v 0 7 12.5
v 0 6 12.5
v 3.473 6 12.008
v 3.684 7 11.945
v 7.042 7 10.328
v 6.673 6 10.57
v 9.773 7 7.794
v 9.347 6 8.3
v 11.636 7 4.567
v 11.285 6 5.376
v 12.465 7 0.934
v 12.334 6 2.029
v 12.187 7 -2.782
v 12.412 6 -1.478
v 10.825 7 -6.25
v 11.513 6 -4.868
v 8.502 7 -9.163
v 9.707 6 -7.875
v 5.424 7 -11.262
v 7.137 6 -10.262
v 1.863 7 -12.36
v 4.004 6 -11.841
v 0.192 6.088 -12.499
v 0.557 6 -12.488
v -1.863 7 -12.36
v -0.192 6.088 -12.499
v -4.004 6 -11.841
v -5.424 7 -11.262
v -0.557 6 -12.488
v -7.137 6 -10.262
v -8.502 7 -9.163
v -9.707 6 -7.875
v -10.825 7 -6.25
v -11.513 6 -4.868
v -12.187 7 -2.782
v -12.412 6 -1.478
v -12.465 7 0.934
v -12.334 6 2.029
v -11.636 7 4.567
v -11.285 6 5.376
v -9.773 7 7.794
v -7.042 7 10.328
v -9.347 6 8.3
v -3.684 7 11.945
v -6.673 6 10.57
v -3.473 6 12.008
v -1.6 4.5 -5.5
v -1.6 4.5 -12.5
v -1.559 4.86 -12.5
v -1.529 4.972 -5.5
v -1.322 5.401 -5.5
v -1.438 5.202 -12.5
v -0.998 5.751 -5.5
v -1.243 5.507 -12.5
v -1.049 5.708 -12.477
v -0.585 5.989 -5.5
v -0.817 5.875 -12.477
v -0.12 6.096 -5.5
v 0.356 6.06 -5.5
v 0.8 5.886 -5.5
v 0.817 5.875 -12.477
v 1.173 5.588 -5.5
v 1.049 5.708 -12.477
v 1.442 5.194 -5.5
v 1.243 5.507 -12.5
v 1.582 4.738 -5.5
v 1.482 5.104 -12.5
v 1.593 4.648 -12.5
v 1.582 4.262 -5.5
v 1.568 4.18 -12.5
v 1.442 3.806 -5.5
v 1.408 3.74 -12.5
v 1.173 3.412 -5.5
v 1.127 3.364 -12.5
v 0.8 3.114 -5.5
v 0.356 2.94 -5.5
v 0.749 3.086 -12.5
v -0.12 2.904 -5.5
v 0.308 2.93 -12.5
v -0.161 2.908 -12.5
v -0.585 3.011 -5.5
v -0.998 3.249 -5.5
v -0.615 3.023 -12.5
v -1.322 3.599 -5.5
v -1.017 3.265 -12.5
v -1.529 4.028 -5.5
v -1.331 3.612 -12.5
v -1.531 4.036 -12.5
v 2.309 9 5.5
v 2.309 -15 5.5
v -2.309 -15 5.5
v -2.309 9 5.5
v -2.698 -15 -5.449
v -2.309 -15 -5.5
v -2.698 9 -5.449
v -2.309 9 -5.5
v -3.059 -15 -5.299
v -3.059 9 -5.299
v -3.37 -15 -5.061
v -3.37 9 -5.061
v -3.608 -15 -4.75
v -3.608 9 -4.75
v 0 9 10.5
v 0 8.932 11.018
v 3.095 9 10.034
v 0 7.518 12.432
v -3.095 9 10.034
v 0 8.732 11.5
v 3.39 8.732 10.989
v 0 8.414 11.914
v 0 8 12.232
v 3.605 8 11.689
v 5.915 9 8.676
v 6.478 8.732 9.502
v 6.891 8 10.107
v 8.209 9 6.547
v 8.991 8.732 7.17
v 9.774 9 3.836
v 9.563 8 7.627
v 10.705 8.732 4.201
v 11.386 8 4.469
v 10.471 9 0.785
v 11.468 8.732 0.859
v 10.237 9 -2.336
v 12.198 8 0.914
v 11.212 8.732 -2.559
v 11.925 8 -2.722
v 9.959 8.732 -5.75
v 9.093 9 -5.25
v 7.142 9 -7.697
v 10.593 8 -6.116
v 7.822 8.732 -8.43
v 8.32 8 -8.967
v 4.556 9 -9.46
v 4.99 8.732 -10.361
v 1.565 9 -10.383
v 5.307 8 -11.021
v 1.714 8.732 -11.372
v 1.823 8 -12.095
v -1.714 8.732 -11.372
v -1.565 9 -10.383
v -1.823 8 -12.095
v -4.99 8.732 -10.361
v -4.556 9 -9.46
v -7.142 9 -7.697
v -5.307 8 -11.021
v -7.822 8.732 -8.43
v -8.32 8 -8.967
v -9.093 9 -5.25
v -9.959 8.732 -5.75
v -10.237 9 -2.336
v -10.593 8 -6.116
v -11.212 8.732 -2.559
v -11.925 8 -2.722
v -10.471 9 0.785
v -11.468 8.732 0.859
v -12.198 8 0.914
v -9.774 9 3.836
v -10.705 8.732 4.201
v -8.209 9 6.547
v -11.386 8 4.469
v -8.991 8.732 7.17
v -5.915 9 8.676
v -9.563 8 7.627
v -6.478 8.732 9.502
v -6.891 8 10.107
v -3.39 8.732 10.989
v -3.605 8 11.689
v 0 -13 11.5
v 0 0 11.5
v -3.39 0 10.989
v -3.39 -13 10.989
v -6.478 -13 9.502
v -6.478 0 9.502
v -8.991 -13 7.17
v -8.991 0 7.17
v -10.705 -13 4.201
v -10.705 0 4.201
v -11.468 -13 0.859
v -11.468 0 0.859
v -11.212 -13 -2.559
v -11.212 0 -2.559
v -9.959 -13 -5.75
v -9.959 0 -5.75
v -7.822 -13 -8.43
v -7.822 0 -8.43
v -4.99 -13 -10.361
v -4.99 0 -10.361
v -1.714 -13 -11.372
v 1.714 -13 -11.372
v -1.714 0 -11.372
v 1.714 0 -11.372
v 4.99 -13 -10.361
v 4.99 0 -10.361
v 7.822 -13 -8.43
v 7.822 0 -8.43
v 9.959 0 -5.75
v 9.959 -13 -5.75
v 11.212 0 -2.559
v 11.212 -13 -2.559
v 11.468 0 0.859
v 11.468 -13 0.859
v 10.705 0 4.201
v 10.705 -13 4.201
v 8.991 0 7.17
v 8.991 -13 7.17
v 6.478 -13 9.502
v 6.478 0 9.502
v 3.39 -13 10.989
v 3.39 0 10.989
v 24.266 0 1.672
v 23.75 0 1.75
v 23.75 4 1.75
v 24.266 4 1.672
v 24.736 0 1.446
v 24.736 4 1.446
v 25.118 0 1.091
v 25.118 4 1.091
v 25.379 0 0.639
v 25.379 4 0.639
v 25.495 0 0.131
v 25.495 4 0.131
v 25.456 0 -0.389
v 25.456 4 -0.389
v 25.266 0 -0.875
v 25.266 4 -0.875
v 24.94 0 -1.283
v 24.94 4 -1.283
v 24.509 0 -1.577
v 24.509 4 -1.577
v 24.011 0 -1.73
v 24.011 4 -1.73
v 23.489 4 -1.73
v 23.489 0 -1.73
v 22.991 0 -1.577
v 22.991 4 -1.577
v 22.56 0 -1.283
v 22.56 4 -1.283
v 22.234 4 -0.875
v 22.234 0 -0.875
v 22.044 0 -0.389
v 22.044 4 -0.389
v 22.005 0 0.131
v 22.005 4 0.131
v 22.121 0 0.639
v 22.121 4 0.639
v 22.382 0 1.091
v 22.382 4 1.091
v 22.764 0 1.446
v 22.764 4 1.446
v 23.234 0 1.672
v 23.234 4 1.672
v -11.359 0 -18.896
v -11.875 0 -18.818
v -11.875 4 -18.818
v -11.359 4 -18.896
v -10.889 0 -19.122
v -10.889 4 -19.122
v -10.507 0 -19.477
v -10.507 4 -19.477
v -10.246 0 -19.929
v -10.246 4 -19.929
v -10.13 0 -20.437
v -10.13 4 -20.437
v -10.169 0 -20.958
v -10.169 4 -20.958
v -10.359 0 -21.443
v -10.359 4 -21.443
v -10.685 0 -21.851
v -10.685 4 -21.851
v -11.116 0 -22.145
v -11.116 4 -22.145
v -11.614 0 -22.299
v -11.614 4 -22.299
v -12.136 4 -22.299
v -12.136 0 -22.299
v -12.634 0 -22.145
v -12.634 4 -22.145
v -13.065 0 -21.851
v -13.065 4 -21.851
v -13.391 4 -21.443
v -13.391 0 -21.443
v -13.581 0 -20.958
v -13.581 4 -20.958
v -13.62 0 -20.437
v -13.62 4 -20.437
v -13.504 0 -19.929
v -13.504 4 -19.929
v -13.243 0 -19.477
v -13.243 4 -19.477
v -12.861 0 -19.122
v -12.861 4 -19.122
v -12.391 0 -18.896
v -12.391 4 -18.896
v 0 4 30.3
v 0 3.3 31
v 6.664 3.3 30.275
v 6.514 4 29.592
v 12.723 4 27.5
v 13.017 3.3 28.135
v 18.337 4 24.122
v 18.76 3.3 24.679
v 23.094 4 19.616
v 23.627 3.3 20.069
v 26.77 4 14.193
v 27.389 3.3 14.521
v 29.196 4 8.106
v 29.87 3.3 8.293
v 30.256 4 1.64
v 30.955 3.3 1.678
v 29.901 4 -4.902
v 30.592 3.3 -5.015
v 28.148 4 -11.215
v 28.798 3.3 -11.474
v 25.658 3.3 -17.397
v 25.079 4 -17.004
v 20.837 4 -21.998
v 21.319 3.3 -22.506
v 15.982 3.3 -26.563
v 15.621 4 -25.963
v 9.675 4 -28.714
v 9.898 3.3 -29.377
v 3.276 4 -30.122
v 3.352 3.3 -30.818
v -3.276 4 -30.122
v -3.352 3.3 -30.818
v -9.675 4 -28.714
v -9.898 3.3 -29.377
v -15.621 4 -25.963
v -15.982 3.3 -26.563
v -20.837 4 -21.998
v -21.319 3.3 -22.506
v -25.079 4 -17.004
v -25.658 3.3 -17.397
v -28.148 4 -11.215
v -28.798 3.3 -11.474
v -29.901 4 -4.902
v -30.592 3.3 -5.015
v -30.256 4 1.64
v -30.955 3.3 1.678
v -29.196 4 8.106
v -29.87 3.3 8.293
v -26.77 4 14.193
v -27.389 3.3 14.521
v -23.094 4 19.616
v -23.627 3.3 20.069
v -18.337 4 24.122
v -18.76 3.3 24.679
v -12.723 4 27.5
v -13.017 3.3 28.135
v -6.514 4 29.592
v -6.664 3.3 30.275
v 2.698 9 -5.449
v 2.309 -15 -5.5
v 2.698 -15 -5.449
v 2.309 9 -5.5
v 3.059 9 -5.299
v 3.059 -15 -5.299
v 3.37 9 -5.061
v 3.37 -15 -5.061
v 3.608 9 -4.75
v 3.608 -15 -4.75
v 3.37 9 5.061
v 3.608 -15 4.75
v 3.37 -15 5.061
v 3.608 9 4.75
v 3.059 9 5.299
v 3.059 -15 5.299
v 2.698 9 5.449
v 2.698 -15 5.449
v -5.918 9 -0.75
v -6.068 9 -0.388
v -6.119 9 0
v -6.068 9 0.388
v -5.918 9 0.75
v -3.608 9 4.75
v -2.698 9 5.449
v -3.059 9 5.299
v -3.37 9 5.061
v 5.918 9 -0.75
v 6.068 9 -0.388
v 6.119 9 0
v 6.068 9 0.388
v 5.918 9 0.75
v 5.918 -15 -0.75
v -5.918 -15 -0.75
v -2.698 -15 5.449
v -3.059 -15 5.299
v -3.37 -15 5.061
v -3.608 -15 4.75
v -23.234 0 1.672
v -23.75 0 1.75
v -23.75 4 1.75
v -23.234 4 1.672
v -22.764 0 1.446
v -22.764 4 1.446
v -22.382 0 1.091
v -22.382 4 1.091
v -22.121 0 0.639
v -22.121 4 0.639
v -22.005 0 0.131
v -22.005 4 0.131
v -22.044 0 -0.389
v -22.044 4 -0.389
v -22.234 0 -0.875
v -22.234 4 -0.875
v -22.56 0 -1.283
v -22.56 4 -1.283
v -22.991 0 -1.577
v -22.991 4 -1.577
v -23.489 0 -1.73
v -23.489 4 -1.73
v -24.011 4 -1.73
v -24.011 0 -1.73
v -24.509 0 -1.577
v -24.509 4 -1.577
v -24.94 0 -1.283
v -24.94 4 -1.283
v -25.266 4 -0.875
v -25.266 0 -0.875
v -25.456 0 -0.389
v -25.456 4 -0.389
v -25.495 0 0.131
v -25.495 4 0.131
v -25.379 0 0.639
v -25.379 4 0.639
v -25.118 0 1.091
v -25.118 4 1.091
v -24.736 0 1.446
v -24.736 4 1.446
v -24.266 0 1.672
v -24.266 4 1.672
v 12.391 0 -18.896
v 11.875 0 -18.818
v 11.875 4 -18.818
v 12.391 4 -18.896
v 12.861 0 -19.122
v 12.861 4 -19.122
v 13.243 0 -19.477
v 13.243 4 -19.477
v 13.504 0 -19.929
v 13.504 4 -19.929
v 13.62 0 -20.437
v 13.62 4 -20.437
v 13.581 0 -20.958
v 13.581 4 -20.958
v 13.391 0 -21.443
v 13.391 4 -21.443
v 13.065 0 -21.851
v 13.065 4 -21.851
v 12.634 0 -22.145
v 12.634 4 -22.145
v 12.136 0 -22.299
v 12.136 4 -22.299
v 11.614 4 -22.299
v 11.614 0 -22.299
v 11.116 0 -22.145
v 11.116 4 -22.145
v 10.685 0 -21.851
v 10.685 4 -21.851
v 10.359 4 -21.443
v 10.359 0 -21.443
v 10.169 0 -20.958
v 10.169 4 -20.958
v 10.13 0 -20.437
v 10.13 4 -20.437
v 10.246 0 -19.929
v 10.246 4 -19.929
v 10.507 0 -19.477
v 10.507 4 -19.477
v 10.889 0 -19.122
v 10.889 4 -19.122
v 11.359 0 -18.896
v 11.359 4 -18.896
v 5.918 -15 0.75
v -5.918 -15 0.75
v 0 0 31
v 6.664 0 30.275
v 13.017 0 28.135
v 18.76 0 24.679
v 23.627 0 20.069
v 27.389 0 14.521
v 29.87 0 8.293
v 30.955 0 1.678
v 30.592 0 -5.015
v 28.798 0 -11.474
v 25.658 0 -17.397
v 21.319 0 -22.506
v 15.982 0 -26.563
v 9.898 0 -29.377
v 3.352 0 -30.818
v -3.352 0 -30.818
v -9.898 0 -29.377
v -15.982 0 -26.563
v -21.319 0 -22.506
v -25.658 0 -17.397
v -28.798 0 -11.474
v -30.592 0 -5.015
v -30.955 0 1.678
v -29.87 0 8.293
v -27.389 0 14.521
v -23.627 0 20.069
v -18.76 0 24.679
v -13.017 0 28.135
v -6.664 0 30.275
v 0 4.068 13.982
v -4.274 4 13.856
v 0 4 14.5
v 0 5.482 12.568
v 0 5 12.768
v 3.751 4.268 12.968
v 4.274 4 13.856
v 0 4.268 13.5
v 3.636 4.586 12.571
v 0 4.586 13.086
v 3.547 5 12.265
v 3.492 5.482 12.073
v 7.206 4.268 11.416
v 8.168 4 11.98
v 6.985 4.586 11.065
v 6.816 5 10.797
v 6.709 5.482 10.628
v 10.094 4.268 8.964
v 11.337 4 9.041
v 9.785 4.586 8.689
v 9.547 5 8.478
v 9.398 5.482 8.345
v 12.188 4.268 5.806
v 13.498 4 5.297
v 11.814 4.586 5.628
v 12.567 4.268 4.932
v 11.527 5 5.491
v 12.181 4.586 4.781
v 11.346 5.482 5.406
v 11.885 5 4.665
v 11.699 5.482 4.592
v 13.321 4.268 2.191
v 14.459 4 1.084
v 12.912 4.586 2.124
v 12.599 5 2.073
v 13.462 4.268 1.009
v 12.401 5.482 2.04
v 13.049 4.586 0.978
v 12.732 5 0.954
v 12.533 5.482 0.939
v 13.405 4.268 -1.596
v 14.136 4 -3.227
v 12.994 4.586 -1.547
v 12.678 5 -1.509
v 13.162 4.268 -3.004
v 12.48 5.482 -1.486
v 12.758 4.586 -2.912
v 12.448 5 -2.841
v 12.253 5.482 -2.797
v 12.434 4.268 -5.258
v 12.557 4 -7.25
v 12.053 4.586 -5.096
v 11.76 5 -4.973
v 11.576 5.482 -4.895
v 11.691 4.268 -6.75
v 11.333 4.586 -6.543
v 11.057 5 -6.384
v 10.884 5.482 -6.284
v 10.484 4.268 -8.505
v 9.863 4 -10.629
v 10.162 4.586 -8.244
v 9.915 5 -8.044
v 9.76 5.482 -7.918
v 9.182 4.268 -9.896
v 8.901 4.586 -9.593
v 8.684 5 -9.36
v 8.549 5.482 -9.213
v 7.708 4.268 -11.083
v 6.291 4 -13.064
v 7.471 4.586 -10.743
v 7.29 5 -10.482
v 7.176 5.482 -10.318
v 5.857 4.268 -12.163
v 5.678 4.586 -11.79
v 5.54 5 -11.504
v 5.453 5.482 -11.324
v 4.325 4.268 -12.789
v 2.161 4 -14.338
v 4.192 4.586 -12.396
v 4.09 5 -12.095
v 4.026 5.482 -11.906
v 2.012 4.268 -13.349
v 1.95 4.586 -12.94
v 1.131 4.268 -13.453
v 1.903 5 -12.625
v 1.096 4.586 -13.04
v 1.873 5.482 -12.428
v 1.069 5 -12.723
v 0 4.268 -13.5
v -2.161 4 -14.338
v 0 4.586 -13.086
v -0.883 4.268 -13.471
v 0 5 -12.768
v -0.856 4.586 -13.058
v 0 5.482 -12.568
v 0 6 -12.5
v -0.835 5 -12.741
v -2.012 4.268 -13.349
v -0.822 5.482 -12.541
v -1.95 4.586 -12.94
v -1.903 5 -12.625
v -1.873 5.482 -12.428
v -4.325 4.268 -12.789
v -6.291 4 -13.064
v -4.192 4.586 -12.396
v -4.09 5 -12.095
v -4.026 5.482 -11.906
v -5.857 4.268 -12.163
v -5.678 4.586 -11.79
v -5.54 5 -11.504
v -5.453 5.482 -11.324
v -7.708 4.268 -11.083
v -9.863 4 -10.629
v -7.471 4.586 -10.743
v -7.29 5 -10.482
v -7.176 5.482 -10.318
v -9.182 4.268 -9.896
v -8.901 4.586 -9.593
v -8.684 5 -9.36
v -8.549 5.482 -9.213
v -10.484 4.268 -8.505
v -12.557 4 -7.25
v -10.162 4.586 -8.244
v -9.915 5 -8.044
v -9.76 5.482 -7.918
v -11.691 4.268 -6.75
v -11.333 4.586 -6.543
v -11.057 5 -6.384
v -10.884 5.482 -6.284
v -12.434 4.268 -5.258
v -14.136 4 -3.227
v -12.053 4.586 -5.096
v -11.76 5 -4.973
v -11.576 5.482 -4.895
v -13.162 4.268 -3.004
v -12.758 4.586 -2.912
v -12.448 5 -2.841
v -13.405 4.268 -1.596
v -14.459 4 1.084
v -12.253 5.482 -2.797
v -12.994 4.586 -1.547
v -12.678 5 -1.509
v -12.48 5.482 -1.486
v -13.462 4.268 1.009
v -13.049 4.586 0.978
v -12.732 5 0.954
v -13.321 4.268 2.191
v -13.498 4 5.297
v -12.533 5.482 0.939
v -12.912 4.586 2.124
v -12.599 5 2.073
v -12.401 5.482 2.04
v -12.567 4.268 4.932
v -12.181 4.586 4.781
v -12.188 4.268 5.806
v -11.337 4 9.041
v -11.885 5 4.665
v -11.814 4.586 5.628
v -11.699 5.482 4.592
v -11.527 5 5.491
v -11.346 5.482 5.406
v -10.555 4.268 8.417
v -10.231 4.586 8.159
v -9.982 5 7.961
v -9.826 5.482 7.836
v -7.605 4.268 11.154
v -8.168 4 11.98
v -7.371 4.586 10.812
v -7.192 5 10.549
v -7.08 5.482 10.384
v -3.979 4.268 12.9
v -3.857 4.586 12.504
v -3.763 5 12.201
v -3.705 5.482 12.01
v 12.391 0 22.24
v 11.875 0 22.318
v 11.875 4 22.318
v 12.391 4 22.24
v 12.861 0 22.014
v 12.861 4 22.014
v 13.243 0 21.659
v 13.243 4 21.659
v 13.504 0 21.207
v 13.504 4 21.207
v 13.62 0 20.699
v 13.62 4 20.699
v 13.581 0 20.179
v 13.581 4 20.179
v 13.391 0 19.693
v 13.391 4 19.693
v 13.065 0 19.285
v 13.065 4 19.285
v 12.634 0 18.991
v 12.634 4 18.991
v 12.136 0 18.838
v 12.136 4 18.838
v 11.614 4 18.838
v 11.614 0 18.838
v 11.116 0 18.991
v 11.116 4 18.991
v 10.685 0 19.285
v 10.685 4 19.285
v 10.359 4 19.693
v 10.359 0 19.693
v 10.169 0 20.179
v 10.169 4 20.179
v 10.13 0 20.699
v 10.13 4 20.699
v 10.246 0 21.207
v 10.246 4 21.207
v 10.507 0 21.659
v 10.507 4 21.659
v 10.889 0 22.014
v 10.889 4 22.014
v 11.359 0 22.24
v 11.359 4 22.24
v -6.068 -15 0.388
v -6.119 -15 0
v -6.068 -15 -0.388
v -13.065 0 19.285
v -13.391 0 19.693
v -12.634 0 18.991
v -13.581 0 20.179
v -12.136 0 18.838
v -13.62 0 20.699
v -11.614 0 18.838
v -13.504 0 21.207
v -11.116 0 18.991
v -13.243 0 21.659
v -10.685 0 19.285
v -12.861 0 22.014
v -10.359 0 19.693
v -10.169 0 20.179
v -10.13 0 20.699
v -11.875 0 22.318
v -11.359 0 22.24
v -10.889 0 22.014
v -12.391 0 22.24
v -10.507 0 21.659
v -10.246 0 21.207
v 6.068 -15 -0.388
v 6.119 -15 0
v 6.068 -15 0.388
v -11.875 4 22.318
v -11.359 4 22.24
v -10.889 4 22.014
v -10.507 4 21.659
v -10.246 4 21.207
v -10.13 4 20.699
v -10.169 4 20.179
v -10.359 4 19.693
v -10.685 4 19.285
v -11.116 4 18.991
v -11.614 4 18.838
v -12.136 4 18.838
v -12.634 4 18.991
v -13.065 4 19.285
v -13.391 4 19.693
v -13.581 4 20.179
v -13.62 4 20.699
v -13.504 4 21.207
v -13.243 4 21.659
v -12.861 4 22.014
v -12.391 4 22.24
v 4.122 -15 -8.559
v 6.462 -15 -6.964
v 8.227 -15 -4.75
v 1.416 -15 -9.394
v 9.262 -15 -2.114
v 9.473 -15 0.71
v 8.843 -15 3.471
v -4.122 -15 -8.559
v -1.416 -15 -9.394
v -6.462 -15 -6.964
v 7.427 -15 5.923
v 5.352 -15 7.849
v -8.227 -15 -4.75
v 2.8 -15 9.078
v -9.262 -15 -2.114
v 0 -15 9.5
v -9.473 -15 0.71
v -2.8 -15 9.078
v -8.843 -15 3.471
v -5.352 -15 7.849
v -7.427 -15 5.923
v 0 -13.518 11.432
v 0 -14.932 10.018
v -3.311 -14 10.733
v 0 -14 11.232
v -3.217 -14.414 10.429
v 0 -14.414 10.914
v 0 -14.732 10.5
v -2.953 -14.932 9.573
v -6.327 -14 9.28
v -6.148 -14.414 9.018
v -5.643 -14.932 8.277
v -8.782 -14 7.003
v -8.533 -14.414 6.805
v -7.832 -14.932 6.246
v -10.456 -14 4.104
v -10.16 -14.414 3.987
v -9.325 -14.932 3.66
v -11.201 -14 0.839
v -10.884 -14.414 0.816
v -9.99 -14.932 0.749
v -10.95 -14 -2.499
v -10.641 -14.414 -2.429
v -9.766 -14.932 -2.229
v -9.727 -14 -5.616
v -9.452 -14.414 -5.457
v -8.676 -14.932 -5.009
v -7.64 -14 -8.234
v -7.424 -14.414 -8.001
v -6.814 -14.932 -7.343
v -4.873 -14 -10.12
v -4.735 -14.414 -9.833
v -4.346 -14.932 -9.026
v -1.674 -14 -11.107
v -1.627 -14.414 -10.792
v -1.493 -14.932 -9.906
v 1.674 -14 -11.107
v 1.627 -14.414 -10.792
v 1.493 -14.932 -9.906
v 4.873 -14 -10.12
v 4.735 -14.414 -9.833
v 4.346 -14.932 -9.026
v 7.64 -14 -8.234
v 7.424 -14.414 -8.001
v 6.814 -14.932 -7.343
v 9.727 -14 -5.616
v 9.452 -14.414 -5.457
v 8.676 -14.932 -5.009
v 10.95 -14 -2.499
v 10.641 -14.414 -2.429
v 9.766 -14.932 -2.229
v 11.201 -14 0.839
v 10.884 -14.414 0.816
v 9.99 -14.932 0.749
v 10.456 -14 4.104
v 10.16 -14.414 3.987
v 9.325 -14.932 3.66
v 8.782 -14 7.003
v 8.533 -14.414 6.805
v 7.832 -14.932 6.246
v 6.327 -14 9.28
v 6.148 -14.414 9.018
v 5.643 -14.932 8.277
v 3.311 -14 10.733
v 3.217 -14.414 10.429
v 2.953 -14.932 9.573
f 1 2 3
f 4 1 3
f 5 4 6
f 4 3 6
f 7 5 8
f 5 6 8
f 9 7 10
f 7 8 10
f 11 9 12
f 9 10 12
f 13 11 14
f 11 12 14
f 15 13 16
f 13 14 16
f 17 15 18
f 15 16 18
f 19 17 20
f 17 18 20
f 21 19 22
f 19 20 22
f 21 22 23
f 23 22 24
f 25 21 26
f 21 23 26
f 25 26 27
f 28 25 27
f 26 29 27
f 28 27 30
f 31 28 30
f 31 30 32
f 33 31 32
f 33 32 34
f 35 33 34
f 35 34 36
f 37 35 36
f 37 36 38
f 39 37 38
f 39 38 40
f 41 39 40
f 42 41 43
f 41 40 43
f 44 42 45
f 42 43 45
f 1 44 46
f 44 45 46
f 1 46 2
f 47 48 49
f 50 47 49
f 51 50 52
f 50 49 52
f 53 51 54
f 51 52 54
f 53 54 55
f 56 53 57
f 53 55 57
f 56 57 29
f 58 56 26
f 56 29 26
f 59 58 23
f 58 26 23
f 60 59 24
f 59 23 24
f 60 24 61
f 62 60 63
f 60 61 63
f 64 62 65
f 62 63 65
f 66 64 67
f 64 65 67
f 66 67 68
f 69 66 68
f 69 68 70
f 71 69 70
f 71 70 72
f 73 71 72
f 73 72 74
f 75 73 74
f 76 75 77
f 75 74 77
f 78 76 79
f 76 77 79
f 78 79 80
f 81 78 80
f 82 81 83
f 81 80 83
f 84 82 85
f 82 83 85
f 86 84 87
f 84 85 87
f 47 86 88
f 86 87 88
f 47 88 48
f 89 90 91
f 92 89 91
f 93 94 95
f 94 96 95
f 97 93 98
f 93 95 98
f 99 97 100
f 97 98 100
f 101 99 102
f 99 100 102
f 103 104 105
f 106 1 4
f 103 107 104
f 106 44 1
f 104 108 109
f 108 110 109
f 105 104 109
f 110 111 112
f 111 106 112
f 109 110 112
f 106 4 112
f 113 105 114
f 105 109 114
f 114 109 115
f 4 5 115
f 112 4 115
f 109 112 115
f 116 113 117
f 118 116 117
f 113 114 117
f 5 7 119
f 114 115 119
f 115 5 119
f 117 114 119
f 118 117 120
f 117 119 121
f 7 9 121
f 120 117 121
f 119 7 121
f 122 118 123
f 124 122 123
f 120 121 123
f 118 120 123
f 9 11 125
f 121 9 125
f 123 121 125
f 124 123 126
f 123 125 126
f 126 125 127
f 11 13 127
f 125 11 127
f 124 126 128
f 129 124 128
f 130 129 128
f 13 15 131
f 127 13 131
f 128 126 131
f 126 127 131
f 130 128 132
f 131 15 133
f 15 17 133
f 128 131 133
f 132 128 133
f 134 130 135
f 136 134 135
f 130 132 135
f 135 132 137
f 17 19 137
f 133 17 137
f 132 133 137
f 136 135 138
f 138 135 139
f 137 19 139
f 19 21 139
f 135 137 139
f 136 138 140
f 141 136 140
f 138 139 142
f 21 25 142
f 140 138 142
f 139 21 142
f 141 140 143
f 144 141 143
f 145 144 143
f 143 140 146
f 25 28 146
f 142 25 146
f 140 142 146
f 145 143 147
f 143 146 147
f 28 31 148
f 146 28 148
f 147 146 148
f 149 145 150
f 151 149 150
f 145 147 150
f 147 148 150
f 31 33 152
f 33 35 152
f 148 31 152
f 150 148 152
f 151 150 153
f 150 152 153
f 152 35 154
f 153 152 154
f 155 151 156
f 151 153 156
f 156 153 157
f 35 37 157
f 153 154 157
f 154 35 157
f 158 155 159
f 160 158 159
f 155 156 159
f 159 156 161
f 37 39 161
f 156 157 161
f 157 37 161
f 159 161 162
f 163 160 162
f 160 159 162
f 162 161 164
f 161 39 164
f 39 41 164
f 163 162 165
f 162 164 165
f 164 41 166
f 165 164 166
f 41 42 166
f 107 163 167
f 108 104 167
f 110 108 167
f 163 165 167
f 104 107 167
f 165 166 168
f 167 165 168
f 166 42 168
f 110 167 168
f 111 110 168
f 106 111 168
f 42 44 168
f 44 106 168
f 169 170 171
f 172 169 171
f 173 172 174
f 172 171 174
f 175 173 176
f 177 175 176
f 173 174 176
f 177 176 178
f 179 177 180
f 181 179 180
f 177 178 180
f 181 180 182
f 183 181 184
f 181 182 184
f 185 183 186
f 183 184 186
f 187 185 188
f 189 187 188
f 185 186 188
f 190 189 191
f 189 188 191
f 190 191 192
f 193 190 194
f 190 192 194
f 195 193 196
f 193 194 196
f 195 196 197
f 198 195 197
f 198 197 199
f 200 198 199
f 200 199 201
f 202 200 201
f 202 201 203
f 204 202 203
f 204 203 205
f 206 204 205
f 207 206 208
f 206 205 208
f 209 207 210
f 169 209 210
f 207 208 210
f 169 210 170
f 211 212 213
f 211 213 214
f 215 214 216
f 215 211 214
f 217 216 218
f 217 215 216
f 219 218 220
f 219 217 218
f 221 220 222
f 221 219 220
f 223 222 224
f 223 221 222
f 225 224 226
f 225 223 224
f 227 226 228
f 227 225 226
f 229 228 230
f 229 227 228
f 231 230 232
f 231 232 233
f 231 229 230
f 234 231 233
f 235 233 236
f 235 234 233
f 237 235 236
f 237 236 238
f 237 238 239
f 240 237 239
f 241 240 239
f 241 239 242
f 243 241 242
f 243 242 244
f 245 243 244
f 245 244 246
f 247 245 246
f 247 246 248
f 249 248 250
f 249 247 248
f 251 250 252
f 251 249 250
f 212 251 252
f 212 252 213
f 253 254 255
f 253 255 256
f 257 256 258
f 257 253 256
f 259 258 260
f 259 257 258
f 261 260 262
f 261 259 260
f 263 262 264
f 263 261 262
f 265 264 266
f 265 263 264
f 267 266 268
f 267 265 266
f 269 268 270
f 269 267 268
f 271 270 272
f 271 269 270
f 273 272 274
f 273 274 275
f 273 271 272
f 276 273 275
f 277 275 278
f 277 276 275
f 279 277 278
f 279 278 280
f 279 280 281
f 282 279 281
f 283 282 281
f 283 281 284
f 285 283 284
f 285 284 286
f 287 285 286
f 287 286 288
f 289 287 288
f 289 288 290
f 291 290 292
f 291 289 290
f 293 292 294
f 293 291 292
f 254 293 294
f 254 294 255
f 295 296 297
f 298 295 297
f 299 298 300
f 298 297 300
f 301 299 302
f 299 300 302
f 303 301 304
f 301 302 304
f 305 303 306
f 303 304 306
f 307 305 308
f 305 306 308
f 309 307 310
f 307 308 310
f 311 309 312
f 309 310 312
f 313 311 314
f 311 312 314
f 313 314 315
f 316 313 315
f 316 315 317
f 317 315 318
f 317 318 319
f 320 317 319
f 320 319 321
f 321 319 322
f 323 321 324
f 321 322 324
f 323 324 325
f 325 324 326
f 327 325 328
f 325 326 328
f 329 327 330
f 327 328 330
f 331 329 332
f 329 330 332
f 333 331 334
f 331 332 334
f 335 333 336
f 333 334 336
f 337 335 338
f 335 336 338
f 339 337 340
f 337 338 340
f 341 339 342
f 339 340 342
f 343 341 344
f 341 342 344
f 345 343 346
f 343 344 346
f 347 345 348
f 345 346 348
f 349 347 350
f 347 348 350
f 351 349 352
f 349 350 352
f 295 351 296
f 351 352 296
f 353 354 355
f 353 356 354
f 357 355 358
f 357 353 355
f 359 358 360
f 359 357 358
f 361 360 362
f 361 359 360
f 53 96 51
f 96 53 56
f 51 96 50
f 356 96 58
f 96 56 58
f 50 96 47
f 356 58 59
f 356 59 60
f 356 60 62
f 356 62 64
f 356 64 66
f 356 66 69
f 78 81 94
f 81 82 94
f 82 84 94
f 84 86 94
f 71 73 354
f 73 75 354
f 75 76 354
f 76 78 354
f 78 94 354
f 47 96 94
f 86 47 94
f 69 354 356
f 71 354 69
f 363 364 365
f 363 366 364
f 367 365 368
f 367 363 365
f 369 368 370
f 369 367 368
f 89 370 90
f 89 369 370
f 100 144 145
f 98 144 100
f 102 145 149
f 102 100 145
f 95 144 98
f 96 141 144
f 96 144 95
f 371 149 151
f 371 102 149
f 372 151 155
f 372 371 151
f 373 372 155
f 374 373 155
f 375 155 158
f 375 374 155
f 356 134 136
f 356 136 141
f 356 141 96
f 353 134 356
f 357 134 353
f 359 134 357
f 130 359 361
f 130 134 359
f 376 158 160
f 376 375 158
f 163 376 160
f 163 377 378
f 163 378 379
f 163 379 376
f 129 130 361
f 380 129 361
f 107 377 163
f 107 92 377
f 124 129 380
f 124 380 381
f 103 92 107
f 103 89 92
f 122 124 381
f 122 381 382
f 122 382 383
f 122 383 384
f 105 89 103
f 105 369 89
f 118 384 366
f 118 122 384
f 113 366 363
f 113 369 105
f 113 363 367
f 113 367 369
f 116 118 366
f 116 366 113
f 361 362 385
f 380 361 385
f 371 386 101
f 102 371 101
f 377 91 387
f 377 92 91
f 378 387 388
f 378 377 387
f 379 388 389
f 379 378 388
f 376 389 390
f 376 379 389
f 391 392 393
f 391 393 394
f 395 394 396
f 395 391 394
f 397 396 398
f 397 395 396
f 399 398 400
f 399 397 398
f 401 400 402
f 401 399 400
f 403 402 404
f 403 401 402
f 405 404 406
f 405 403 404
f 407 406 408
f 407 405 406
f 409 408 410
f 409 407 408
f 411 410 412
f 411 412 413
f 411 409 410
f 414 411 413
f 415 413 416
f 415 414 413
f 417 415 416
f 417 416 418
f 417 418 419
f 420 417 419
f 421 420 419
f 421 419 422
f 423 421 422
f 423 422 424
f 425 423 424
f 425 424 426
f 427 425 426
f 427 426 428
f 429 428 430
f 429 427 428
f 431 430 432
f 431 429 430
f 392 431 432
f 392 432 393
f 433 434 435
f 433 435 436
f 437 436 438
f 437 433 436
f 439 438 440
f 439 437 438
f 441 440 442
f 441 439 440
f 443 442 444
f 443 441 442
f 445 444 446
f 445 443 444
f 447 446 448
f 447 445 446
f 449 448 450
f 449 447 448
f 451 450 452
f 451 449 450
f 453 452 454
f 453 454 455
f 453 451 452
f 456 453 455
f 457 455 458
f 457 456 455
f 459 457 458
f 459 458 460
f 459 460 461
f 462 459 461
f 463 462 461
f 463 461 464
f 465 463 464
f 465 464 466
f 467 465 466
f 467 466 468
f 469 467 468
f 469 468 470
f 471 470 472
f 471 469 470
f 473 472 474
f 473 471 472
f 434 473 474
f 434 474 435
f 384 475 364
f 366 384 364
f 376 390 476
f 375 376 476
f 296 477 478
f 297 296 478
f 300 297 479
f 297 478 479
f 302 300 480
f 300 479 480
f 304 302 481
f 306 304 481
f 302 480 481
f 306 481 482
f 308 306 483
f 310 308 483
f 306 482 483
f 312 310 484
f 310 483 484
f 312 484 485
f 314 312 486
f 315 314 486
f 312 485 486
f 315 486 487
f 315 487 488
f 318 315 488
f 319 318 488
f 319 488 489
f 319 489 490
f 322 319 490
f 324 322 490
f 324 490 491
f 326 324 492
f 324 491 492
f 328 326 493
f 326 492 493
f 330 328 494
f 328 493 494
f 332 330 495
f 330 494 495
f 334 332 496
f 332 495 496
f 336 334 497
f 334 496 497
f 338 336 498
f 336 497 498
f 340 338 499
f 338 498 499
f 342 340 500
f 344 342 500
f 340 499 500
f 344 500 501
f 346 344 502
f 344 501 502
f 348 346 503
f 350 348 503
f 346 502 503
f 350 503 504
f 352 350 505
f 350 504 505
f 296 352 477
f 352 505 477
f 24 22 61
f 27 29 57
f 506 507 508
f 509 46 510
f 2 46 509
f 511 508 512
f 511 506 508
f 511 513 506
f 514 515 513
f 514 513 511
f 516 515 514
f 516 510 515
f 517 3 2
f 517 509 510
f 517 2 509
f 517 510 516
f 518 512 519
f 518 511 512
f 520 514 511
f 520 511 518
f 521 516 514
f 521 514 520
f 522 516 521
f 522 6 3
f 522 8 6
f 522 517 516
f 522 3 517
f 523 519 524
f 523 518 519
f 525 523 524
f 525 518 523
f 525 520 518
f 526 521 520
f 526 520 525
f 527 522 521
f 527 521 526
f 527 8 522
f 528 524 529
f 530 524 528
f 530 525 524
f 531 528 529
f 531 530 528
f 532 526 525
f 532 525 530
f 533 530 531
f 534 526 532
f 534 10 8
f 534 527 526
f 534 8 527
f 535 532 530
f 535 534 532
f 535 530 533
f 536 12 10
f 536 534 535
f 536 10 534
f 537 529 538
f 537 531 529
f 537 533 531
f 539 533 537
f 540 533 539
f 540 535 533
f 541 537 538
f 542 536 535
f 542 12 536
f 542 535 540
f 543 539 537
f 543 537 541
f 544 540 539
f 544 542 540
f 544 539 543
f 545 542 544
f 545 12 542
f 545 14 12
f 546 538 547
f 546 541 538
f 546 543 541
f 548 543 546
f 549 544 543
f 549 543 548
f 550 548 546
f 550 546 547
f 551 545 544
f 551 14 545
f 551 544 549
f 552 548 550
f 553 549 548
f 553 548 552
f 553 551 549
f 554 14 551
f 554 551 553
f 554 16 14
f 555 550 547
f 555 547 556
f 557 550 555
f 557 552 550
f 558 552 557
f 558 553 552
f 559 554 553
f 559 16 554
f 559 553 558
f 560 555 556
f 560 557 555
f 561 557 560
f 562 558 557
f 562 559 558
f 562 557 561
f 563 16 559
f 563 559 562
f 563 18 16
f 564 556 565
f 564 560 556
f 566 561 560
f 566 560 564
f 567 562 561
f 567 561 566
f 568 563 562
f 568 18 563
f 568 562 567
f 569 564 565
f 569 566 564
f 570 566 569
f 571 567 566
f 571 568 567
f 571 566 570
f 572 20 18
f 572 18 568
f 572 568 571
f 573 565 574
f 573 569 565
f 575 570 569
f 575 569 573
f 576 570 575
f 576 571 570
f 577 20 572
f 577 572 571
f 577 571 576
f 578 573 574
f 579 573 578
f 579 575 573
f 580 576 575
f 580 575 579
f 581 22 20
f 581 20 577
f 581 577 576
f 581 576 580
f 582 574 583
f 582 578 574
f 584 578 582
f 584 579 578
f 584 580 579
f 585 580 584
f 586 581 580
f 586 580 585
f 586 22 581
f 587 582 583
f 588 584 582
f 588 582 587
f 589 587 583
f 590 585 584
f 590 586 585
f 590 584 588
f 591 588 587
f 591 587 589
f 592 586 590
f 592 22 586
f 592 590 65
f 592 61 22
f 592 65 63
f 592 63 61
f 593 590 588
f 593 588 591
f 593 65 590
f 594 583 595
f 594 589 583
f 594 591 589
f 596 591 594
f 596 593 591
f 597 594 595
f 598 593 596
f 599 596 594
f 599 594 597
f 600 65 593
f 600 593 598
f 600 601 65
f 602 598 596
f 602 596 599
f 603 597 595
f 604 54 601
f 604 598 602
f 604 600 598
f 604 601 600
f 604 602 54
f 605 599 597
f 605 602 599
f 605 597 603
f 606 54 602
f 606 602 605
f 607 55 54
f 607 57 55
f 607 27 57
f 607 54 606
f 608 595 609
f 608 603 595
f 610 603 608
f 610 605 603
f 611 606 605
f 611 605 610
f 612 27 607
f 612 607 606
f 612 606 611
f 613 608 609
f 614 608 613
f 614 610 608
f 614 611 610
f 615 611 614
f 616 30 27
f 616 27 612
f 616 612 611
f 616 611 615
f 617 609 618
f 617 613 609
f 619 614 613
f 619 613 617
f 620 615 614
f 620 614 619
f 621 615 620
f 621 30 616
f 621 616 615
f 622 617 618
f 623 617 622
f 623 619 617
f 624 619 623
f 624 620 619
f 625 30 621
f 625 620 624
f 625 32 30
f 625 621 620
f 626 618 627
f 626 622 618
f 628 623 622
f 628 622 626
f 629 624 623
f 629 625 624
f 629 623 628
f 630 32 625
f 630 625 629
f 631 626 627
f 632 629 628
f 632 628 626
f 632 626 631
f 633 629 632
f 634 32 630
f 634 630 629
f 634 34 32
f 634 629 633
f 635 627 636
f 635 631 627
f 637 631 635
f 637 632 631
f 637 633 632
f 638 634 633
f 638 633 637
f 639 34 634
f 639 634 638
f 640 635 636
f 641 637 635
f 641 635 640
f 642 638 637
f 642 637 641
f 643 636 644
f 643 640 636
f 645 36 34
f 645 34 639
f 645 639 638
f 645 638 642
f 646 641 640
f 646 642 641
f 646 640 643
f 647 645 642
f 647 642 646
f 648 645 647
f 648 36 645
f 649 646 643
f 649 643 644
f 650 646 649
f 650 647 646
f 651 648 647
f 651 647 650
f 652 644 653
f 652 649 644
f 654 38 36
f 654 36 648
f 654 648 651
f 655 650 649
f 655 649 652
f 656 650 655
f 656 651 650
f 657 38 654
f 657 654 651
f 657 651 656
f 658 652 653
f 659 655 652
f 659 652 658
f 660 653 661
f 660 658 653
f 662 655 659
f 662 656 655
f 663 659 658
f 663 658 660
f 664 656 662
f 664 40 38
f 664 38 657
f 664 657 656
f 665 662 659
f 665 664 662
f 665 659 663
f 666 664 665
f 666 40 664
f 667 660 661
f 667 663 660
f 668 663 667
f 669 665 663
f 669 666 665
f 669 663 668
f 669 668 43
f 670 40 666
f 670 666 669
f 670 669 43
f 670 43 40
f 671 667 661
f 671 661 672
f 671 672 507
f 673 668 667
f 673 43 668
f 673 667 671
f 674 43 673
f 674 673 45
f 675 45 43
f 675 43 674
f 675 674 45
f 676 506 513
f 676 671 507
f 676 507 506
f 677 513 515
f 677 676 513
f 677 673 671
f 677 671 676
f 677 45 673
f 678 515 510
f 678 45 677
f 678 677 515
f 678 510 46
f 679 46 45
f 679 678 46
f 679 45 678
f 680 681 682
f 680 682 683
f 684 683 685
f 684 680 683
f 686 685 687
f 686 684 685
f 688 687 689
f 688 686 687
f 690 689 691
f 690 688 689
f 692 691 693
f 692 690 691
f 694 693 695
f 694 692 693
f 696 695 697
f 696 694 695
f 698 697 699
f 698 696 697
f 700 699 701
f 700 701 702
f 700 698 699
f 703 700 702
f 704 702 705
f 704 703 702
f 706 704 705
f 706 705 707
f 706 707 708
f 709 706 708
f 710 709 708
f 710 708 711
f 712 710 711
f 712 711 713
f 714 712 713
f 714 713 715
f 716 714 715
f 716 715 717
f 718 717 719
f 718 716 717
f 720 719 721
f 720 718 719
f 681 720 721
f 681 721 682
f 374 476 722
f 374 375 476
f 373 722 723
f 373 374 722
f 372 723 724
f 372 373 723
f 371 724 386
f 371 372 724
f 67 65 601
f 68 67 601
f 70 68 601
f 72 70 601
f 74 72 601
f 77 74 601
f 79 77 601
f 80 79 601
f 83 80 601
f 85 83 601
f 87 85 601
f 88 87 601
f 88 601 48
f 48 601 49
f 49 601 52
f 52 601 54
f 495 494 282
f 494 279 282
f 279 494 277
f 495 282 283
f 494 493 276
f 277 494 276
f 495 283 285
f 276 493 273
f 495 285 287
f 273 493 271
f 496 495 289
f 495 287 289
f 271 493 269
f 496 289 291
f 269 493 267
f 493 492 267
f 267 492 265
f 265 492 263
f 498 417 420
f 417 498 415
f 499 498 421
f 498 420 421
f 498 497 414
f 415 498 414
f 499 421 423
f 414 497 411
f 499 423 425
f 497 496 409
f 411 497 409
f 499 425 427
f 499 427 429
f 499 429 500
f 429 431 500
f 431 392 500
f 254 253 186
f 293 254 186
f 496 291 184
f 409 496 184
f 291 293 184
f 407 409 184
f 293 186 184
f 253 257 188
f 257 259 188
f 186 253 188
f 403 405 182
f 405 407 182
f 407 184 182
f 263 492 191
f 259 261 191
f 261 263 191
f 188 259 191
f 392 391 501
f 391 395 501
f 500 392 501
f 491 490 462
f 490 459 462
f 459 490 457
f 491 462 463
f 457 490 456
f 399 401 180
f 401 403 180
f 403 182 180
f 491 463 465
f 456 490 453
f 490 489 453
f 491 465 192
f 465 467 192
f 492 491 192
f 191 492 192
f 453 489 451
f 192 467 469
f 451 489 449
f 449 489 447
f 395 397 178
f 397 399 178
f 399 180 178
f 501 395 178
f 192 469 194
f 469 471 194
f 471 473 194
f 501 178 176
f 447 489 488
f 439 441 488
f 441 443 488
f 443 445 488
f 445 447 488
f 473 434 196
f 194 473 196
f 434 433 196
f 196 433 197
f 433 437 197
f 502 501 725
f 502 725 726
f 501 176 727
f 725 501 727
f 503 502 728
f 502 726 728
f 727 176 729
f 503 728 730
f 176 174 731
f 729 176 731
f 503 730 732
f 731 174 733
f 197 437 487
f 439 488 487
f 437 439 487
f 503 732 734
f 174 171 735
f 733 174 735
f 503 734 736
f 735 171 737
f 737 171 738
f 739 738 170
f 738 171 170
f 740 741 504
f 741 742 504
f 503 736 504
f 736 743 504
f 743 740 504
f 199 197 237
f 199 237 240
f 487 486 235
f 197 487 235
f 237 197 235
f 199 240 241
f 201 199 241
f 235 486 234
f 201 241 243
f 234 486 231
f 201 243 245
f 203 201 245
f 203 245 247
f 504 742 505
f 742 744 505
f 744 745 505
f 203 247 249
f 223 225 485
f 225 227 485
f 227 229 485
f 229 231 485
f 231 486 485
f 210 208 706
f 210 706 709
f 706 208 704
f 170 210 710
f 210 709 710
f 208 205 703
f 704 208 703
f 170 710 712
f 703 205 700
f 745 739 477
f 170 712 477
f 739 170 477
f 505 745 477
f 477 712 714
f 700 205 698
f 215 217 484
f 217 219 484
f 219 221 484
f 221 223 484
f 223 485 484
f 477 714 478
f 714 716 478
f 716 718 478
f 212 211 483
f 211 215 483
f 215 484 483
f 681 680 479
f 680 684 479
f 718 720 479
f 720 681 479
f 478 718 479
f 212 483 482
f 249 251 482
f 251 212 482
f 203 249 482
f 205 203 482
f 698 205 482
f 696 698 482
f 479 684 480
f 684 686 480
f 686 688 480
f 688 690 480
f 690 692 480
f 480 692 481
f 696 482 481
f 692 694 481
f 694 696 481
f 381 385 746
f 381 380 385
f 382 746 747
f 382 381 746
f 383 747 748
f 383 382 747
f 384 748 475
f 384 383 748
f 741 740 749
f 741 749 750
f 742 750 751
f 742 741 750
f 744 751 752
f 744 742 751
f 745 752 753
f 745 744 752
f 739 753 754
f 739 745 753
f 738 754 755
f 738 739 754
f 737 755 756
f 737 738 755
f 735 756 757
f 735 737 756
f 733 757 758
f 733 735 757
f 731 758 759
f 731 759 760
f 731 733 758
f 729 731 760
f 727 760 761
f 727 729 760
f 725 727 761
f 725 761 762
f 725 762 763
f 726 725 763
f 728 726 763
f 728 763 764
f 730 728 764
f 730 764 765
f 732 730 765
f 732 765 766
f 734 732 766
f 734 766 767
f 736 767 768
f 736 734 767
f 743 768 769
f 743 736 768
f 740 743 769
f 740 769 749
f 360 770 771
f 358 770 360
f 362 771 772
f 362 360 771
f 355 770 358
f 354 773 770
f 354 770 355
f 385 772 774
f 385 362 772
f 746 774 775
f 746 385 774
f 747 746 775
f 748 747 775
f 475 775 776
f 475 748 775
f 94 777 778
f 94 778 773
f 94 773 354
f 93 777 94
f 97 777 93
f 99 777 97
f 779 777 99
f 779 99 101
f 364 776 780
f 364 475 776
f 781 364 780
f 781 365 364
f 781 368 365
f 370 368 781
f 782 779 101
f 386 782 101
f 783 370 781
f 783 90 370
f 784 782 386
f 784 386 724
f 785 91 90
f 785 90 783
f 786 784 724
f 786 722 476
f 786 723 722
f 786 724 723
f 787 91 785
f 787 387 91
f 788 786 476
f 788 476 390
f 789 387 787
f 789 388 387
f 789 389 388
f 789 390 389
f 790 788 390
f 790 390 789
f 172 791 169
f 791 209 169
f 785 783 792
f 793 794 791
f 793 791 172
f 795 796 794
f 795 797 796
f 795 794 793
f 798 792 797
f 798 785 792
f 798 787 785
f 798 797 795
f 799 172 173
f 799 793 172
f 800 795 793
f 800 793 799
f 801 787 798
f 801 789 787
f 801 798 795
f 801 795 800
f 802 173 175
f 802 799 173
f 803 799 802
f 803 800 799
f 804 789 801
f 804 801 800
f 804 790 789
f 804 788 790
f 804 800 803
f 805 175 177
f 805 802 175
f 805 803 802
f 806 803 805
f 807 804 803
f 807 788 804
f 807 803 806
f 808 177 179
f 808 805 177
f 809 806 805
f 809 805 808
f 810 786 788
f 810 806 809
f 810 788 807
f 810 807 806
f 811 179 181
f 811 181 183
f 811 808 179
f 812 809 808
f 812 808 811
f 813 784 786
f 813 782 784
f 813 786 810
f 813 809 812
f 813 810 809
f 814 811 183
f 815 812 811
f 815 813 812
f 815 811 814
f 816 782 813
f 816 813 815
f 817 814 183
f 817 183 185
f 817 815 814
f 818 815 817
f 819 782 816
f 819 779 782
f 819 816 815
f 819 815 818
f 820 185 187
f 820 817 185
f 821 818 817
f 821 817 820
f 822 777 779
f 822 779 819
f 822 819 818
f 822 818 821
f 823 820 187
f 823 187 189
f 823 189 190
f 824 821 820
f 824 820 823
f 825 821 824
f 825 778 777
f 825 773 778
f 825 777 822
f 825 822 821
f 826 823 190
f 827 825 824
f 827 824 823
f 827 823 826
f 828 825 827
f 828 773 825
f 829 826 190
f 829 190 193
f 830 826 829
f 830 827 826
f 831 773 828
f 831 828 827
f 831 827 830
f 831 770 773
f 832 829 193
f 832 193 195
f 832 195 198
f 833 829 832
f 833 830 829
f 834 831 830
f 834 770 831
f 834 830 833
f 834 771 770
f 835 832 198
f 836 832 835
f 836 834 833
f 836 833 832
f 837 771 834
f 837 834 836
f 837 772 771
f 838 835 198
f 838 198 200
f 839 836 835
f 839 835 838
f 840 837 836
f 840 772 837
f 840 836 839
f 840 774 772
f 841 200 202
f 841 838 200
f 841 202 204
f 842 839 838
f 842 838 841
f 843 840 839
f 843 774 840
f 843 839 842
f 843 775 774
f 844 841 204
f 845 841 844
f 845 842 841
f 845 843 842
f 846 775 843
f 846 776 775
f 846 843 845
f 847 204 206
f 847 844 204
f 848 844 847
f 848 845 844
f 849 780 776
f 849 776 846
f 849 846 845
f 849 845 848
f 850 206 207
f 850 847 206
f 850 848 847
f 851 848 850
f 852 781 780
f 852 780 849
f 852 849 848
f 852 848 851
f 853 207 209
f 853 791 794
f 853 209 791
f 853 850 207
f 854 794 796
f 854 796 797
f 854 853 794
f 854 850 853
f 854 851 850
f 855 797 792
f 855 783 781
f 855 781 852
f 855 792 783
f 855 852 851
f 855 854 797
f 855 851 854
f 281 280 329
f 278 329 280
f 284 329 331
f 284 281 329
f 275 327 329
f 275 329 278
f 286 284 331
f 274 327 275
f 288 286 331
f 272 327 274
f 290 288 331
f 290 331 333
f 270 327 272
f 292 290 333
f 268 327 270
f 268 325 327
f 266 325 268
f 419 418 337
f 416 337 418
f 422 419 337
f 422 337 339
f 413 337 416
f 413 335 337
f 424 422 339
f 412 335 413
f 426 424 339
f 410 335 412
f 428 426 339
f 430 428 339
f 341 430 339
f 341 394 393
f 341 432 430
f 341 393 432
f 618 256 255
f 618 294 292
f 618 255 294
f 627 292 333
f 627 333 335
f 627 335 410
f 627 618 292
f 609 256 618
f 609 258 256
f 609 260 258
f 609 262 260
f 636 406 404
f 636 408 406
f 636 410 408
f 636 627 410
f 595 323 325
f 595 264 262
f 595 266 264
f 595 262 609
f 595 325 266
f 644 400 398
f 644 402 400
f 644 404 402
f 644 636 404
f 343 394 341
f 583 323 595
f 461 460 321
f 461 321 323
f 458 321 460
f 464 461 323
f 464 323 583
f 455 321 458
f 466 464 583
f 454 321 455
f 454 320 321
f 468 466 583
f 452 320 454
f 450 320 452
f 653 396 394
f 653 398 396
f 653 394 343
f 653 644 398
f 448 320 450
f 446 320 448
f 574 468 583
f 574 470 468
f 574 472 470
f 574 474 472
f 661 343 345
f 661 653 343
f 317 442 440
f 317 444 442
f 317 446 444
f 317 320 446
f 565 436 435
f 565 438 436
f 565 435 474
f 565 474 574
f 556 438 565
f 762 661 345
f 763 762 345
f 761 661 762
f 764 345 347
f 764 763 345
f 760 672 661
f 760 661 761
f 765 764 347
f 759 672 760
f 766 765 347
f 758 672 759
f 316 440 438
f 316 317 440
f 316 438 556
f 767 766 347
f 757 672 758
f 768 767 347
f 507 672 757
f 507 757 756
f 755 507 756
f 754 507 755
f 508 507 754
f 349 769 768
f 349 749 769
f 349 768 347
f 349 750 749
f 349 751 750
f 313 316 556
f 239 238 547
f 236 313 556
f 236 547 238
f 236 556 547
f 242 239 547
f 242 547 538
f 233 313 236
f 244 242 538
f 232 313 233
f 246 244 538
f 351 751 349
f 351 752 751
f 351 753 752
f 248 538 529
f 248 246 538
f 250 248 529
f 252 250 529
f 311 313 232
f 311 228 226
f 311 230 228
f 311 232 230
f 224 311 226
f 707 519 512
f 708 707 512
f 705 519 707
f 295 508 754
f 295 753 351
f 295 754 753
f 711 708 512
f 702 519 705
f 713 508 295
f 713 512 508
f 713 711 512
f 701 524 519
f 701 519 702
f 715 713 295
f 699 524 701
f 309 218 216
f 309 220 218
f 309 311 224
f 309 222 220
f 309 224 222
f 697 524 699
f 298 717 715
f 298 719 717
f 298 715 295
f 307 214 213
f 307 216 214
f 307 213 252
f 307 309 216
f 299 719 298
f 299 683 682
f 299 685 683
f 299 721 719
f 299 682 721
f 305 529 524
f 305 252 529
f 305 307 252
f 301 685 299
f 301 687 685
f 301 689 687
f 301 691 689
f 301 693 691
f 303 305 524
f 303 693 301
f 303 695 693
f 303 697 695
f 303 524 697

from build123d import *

# Parameters (mm, degrees)
SKETCH1_R           = 31
SKETCH1_R_2         = 1.75
BOSS_EXTRUDE1_DEPTH = 4
SKETCH2_R           = 12.5
BOSS_EXTRUDE2_DEPTH = 5
CUT_EXTRUDE1_DEPTH  = 45.754888001
FILLET1_R           = 2
FILLET2_R           = 2
SKETCH5_R           = 1.6
CUT_EXTRUDE2_DEPTH  = 10
CHAMFER2_SIZE       = 0.7
SKETCH6_R           = 11.5
BOSS_EXTRUDE3_DEPTH = 15
FILLET3_R           = 2
CUT_EXTRUDE3_DEPTH  = 50.979995998
FILLET4_R           = 1.5


with BuildPart() as part:
    # Sketch1 → Boss-Extrude1 (new body)
    with BuildSketch(Plane(origin=(0, 0, 0), x_dir=(1, 0, 0), z_dir=(0, 1, 0))):
        with Locations(Location((0, 0, 0), (0, 0, 270))):
            Circle(SKETCH1_R)
        with Locations(Location((-11.875, 20.56810334, 0), (0, 0, 270))):
            Circle(SKETCH1_R_2, mode=Mode.SUBTRACT)
        with Locations(Location((11.875, 20.56810334, 0), (0, 0, 270))):
            Circle(SKETCH1_R_2, mode=Mode.SUBTRACT)
        with Locations(Location((23.75, 0, 0), (0, 0, 270))):
            Circle(SKETCH1_R_2, mode=Mode.SUBTRACT)
        with Locations(Location((11.875, -20.56810334, 0), (0, 0, 270))):
            Circle(SKETCH1_R_2, mode=Mode.SUBTRACT)
        with Locations(Location((-11.875, -20.56810334, 0), (0, 0, 270))):
            Circle(SKETCH1_R_2, mode=Mode.SUBTRACT)
        with Locations(Location((-23.75, 0, 0), (0, 0, 270))):
            Circle(SKETCH1_R_2, mode=Mode.SUBTRACT)
    extrude(amount=BOSS_EXTRUDE1_DEPTH)

    # Sketch2 → Boss-Extrude2 (add)
    with BuildSketch(Plane(origin=(0, 4, 0), x_dir=(1, 0, 0), z_dir=(0, 1, 0))):
        with Locations(Location((0, 0, 0), (0, 0, 270))):
            Circle(SKETCH2_R)
    extrude(amount=BOSS_EXTRUDE2_DEPTH)

    # Sketch3 → Cut-Extrude1 (cut, through all)
    with BuildSketch(Plane(origin=(0, 9, 0), x_dir=(1, 0, 0), z_dir=(0, 1, 0))):
        Polygon((3.175426481, 5.5), (-3.175426481, 5.5), (-6.350852961, 0), (-3.175426481, -5.5), (3.175426481, -5.5), (6.350852961, 0), align=None)
    extrude(amount=-CUT_EXTRUDE1_DEPTH, mode=Mode.SUBTRACT)

    # Fillet1
    fillet1_edges = [part.edges().sort_by_distance(p)[0] for p in [
        (3.175426481, 4.5, -5.5),
        (6.350852961, 4.5, 0),
        (3.175426481, 4.5, 5.5),
        (-3.175426481, 4.5, 5.5),
        (-6.350852961, 4.5, 0),
        (-3.175426481, 4.5, -5.5),
    ]]
    fillet(fillet1_edges, radius=FILLET1_R)

    # Fillet2
    fillet2_edges = [part.edges().sort_by_distance(p)[0] for p in [
        (0, 4, -12.5),
        (0, 9, -12.5),
    ]]
    fillet(fillet2_edges, radius=FILLET2_R)

    # Sketch5 → Cut-Extrude2 (cut)
    with BuildSketch(Plane(origin=(0, 9, -12.5), x_dir=(-1, 0, 0), z_dir=(0, 0, -1))):
        with Locations((0, -4.5)):
            Circle(SKETCH5_R)
    extrude(amount=-CUT_EXTRUDE2_DEPTH, mode=Mode.SUBTRACT)

    # Chamfer2
    chamfer2_edges = [part.edges().sort_by_distance(p)[0] for p in [
        (0, 4, -31),
    ]]
    chamfer(chamfer2_edges, length=CHAMFER2_SIZE)

    # Sketch6 → Boss-Extrude3 (add)
    with BuildSketch(Plane(origin=(0, 0, 0), x_dir=(-1, 0, 0), z_dir=(0, -1, 0))):
        with Locations(Location((0, 0, 0), (0, 0, 270))):
            Circle(SKETCH6_R)
    extrude(amount=BOSS_EXTRUDE3_DEPTH)

    # Fillet3
    fillet3_edges = [part.edges().sort_by_distance(p)[0] for p in [
        (0, -15, -11.5),
    ]]
    fillet(fillet3_edges, radius=FILLET3_R)

    # Sketch7 → Cut-Extrude3 (cut, through all)
    with BuildSketch(Plane(origin=(0, -15, 0), x_dir=(-1, 0, 0), z_dir=(0, -1, 0))):
        Polygon((-3.175426481, -5.5), (3.175426481, -5.5), (6.350852961, 0), (3.175426481, 5.5), (-3.175426481, 5.5), (-6.350852961, 0), align=None)
    extrude(amount=-CUT_EXTRUDE3_DEPTH, mode=Mode.SUBTRACT)

    # Fillet4
    fillet4_edges = [part.edges().sort_by_distance(p)[0] for p in [
        (3.175426481, -3, 5.5),
        (3.175426481, -3, -5.5),
        (6.350852961, -3, 0),
        (-3.175426481, -3, -5.5),
        (-6.350852961, -3, 0),
        (-3.175426481, -3, 5.5),
    ]]
    fillet(fillet4_edges, radius=FILLET4_R)


solid = part.part
